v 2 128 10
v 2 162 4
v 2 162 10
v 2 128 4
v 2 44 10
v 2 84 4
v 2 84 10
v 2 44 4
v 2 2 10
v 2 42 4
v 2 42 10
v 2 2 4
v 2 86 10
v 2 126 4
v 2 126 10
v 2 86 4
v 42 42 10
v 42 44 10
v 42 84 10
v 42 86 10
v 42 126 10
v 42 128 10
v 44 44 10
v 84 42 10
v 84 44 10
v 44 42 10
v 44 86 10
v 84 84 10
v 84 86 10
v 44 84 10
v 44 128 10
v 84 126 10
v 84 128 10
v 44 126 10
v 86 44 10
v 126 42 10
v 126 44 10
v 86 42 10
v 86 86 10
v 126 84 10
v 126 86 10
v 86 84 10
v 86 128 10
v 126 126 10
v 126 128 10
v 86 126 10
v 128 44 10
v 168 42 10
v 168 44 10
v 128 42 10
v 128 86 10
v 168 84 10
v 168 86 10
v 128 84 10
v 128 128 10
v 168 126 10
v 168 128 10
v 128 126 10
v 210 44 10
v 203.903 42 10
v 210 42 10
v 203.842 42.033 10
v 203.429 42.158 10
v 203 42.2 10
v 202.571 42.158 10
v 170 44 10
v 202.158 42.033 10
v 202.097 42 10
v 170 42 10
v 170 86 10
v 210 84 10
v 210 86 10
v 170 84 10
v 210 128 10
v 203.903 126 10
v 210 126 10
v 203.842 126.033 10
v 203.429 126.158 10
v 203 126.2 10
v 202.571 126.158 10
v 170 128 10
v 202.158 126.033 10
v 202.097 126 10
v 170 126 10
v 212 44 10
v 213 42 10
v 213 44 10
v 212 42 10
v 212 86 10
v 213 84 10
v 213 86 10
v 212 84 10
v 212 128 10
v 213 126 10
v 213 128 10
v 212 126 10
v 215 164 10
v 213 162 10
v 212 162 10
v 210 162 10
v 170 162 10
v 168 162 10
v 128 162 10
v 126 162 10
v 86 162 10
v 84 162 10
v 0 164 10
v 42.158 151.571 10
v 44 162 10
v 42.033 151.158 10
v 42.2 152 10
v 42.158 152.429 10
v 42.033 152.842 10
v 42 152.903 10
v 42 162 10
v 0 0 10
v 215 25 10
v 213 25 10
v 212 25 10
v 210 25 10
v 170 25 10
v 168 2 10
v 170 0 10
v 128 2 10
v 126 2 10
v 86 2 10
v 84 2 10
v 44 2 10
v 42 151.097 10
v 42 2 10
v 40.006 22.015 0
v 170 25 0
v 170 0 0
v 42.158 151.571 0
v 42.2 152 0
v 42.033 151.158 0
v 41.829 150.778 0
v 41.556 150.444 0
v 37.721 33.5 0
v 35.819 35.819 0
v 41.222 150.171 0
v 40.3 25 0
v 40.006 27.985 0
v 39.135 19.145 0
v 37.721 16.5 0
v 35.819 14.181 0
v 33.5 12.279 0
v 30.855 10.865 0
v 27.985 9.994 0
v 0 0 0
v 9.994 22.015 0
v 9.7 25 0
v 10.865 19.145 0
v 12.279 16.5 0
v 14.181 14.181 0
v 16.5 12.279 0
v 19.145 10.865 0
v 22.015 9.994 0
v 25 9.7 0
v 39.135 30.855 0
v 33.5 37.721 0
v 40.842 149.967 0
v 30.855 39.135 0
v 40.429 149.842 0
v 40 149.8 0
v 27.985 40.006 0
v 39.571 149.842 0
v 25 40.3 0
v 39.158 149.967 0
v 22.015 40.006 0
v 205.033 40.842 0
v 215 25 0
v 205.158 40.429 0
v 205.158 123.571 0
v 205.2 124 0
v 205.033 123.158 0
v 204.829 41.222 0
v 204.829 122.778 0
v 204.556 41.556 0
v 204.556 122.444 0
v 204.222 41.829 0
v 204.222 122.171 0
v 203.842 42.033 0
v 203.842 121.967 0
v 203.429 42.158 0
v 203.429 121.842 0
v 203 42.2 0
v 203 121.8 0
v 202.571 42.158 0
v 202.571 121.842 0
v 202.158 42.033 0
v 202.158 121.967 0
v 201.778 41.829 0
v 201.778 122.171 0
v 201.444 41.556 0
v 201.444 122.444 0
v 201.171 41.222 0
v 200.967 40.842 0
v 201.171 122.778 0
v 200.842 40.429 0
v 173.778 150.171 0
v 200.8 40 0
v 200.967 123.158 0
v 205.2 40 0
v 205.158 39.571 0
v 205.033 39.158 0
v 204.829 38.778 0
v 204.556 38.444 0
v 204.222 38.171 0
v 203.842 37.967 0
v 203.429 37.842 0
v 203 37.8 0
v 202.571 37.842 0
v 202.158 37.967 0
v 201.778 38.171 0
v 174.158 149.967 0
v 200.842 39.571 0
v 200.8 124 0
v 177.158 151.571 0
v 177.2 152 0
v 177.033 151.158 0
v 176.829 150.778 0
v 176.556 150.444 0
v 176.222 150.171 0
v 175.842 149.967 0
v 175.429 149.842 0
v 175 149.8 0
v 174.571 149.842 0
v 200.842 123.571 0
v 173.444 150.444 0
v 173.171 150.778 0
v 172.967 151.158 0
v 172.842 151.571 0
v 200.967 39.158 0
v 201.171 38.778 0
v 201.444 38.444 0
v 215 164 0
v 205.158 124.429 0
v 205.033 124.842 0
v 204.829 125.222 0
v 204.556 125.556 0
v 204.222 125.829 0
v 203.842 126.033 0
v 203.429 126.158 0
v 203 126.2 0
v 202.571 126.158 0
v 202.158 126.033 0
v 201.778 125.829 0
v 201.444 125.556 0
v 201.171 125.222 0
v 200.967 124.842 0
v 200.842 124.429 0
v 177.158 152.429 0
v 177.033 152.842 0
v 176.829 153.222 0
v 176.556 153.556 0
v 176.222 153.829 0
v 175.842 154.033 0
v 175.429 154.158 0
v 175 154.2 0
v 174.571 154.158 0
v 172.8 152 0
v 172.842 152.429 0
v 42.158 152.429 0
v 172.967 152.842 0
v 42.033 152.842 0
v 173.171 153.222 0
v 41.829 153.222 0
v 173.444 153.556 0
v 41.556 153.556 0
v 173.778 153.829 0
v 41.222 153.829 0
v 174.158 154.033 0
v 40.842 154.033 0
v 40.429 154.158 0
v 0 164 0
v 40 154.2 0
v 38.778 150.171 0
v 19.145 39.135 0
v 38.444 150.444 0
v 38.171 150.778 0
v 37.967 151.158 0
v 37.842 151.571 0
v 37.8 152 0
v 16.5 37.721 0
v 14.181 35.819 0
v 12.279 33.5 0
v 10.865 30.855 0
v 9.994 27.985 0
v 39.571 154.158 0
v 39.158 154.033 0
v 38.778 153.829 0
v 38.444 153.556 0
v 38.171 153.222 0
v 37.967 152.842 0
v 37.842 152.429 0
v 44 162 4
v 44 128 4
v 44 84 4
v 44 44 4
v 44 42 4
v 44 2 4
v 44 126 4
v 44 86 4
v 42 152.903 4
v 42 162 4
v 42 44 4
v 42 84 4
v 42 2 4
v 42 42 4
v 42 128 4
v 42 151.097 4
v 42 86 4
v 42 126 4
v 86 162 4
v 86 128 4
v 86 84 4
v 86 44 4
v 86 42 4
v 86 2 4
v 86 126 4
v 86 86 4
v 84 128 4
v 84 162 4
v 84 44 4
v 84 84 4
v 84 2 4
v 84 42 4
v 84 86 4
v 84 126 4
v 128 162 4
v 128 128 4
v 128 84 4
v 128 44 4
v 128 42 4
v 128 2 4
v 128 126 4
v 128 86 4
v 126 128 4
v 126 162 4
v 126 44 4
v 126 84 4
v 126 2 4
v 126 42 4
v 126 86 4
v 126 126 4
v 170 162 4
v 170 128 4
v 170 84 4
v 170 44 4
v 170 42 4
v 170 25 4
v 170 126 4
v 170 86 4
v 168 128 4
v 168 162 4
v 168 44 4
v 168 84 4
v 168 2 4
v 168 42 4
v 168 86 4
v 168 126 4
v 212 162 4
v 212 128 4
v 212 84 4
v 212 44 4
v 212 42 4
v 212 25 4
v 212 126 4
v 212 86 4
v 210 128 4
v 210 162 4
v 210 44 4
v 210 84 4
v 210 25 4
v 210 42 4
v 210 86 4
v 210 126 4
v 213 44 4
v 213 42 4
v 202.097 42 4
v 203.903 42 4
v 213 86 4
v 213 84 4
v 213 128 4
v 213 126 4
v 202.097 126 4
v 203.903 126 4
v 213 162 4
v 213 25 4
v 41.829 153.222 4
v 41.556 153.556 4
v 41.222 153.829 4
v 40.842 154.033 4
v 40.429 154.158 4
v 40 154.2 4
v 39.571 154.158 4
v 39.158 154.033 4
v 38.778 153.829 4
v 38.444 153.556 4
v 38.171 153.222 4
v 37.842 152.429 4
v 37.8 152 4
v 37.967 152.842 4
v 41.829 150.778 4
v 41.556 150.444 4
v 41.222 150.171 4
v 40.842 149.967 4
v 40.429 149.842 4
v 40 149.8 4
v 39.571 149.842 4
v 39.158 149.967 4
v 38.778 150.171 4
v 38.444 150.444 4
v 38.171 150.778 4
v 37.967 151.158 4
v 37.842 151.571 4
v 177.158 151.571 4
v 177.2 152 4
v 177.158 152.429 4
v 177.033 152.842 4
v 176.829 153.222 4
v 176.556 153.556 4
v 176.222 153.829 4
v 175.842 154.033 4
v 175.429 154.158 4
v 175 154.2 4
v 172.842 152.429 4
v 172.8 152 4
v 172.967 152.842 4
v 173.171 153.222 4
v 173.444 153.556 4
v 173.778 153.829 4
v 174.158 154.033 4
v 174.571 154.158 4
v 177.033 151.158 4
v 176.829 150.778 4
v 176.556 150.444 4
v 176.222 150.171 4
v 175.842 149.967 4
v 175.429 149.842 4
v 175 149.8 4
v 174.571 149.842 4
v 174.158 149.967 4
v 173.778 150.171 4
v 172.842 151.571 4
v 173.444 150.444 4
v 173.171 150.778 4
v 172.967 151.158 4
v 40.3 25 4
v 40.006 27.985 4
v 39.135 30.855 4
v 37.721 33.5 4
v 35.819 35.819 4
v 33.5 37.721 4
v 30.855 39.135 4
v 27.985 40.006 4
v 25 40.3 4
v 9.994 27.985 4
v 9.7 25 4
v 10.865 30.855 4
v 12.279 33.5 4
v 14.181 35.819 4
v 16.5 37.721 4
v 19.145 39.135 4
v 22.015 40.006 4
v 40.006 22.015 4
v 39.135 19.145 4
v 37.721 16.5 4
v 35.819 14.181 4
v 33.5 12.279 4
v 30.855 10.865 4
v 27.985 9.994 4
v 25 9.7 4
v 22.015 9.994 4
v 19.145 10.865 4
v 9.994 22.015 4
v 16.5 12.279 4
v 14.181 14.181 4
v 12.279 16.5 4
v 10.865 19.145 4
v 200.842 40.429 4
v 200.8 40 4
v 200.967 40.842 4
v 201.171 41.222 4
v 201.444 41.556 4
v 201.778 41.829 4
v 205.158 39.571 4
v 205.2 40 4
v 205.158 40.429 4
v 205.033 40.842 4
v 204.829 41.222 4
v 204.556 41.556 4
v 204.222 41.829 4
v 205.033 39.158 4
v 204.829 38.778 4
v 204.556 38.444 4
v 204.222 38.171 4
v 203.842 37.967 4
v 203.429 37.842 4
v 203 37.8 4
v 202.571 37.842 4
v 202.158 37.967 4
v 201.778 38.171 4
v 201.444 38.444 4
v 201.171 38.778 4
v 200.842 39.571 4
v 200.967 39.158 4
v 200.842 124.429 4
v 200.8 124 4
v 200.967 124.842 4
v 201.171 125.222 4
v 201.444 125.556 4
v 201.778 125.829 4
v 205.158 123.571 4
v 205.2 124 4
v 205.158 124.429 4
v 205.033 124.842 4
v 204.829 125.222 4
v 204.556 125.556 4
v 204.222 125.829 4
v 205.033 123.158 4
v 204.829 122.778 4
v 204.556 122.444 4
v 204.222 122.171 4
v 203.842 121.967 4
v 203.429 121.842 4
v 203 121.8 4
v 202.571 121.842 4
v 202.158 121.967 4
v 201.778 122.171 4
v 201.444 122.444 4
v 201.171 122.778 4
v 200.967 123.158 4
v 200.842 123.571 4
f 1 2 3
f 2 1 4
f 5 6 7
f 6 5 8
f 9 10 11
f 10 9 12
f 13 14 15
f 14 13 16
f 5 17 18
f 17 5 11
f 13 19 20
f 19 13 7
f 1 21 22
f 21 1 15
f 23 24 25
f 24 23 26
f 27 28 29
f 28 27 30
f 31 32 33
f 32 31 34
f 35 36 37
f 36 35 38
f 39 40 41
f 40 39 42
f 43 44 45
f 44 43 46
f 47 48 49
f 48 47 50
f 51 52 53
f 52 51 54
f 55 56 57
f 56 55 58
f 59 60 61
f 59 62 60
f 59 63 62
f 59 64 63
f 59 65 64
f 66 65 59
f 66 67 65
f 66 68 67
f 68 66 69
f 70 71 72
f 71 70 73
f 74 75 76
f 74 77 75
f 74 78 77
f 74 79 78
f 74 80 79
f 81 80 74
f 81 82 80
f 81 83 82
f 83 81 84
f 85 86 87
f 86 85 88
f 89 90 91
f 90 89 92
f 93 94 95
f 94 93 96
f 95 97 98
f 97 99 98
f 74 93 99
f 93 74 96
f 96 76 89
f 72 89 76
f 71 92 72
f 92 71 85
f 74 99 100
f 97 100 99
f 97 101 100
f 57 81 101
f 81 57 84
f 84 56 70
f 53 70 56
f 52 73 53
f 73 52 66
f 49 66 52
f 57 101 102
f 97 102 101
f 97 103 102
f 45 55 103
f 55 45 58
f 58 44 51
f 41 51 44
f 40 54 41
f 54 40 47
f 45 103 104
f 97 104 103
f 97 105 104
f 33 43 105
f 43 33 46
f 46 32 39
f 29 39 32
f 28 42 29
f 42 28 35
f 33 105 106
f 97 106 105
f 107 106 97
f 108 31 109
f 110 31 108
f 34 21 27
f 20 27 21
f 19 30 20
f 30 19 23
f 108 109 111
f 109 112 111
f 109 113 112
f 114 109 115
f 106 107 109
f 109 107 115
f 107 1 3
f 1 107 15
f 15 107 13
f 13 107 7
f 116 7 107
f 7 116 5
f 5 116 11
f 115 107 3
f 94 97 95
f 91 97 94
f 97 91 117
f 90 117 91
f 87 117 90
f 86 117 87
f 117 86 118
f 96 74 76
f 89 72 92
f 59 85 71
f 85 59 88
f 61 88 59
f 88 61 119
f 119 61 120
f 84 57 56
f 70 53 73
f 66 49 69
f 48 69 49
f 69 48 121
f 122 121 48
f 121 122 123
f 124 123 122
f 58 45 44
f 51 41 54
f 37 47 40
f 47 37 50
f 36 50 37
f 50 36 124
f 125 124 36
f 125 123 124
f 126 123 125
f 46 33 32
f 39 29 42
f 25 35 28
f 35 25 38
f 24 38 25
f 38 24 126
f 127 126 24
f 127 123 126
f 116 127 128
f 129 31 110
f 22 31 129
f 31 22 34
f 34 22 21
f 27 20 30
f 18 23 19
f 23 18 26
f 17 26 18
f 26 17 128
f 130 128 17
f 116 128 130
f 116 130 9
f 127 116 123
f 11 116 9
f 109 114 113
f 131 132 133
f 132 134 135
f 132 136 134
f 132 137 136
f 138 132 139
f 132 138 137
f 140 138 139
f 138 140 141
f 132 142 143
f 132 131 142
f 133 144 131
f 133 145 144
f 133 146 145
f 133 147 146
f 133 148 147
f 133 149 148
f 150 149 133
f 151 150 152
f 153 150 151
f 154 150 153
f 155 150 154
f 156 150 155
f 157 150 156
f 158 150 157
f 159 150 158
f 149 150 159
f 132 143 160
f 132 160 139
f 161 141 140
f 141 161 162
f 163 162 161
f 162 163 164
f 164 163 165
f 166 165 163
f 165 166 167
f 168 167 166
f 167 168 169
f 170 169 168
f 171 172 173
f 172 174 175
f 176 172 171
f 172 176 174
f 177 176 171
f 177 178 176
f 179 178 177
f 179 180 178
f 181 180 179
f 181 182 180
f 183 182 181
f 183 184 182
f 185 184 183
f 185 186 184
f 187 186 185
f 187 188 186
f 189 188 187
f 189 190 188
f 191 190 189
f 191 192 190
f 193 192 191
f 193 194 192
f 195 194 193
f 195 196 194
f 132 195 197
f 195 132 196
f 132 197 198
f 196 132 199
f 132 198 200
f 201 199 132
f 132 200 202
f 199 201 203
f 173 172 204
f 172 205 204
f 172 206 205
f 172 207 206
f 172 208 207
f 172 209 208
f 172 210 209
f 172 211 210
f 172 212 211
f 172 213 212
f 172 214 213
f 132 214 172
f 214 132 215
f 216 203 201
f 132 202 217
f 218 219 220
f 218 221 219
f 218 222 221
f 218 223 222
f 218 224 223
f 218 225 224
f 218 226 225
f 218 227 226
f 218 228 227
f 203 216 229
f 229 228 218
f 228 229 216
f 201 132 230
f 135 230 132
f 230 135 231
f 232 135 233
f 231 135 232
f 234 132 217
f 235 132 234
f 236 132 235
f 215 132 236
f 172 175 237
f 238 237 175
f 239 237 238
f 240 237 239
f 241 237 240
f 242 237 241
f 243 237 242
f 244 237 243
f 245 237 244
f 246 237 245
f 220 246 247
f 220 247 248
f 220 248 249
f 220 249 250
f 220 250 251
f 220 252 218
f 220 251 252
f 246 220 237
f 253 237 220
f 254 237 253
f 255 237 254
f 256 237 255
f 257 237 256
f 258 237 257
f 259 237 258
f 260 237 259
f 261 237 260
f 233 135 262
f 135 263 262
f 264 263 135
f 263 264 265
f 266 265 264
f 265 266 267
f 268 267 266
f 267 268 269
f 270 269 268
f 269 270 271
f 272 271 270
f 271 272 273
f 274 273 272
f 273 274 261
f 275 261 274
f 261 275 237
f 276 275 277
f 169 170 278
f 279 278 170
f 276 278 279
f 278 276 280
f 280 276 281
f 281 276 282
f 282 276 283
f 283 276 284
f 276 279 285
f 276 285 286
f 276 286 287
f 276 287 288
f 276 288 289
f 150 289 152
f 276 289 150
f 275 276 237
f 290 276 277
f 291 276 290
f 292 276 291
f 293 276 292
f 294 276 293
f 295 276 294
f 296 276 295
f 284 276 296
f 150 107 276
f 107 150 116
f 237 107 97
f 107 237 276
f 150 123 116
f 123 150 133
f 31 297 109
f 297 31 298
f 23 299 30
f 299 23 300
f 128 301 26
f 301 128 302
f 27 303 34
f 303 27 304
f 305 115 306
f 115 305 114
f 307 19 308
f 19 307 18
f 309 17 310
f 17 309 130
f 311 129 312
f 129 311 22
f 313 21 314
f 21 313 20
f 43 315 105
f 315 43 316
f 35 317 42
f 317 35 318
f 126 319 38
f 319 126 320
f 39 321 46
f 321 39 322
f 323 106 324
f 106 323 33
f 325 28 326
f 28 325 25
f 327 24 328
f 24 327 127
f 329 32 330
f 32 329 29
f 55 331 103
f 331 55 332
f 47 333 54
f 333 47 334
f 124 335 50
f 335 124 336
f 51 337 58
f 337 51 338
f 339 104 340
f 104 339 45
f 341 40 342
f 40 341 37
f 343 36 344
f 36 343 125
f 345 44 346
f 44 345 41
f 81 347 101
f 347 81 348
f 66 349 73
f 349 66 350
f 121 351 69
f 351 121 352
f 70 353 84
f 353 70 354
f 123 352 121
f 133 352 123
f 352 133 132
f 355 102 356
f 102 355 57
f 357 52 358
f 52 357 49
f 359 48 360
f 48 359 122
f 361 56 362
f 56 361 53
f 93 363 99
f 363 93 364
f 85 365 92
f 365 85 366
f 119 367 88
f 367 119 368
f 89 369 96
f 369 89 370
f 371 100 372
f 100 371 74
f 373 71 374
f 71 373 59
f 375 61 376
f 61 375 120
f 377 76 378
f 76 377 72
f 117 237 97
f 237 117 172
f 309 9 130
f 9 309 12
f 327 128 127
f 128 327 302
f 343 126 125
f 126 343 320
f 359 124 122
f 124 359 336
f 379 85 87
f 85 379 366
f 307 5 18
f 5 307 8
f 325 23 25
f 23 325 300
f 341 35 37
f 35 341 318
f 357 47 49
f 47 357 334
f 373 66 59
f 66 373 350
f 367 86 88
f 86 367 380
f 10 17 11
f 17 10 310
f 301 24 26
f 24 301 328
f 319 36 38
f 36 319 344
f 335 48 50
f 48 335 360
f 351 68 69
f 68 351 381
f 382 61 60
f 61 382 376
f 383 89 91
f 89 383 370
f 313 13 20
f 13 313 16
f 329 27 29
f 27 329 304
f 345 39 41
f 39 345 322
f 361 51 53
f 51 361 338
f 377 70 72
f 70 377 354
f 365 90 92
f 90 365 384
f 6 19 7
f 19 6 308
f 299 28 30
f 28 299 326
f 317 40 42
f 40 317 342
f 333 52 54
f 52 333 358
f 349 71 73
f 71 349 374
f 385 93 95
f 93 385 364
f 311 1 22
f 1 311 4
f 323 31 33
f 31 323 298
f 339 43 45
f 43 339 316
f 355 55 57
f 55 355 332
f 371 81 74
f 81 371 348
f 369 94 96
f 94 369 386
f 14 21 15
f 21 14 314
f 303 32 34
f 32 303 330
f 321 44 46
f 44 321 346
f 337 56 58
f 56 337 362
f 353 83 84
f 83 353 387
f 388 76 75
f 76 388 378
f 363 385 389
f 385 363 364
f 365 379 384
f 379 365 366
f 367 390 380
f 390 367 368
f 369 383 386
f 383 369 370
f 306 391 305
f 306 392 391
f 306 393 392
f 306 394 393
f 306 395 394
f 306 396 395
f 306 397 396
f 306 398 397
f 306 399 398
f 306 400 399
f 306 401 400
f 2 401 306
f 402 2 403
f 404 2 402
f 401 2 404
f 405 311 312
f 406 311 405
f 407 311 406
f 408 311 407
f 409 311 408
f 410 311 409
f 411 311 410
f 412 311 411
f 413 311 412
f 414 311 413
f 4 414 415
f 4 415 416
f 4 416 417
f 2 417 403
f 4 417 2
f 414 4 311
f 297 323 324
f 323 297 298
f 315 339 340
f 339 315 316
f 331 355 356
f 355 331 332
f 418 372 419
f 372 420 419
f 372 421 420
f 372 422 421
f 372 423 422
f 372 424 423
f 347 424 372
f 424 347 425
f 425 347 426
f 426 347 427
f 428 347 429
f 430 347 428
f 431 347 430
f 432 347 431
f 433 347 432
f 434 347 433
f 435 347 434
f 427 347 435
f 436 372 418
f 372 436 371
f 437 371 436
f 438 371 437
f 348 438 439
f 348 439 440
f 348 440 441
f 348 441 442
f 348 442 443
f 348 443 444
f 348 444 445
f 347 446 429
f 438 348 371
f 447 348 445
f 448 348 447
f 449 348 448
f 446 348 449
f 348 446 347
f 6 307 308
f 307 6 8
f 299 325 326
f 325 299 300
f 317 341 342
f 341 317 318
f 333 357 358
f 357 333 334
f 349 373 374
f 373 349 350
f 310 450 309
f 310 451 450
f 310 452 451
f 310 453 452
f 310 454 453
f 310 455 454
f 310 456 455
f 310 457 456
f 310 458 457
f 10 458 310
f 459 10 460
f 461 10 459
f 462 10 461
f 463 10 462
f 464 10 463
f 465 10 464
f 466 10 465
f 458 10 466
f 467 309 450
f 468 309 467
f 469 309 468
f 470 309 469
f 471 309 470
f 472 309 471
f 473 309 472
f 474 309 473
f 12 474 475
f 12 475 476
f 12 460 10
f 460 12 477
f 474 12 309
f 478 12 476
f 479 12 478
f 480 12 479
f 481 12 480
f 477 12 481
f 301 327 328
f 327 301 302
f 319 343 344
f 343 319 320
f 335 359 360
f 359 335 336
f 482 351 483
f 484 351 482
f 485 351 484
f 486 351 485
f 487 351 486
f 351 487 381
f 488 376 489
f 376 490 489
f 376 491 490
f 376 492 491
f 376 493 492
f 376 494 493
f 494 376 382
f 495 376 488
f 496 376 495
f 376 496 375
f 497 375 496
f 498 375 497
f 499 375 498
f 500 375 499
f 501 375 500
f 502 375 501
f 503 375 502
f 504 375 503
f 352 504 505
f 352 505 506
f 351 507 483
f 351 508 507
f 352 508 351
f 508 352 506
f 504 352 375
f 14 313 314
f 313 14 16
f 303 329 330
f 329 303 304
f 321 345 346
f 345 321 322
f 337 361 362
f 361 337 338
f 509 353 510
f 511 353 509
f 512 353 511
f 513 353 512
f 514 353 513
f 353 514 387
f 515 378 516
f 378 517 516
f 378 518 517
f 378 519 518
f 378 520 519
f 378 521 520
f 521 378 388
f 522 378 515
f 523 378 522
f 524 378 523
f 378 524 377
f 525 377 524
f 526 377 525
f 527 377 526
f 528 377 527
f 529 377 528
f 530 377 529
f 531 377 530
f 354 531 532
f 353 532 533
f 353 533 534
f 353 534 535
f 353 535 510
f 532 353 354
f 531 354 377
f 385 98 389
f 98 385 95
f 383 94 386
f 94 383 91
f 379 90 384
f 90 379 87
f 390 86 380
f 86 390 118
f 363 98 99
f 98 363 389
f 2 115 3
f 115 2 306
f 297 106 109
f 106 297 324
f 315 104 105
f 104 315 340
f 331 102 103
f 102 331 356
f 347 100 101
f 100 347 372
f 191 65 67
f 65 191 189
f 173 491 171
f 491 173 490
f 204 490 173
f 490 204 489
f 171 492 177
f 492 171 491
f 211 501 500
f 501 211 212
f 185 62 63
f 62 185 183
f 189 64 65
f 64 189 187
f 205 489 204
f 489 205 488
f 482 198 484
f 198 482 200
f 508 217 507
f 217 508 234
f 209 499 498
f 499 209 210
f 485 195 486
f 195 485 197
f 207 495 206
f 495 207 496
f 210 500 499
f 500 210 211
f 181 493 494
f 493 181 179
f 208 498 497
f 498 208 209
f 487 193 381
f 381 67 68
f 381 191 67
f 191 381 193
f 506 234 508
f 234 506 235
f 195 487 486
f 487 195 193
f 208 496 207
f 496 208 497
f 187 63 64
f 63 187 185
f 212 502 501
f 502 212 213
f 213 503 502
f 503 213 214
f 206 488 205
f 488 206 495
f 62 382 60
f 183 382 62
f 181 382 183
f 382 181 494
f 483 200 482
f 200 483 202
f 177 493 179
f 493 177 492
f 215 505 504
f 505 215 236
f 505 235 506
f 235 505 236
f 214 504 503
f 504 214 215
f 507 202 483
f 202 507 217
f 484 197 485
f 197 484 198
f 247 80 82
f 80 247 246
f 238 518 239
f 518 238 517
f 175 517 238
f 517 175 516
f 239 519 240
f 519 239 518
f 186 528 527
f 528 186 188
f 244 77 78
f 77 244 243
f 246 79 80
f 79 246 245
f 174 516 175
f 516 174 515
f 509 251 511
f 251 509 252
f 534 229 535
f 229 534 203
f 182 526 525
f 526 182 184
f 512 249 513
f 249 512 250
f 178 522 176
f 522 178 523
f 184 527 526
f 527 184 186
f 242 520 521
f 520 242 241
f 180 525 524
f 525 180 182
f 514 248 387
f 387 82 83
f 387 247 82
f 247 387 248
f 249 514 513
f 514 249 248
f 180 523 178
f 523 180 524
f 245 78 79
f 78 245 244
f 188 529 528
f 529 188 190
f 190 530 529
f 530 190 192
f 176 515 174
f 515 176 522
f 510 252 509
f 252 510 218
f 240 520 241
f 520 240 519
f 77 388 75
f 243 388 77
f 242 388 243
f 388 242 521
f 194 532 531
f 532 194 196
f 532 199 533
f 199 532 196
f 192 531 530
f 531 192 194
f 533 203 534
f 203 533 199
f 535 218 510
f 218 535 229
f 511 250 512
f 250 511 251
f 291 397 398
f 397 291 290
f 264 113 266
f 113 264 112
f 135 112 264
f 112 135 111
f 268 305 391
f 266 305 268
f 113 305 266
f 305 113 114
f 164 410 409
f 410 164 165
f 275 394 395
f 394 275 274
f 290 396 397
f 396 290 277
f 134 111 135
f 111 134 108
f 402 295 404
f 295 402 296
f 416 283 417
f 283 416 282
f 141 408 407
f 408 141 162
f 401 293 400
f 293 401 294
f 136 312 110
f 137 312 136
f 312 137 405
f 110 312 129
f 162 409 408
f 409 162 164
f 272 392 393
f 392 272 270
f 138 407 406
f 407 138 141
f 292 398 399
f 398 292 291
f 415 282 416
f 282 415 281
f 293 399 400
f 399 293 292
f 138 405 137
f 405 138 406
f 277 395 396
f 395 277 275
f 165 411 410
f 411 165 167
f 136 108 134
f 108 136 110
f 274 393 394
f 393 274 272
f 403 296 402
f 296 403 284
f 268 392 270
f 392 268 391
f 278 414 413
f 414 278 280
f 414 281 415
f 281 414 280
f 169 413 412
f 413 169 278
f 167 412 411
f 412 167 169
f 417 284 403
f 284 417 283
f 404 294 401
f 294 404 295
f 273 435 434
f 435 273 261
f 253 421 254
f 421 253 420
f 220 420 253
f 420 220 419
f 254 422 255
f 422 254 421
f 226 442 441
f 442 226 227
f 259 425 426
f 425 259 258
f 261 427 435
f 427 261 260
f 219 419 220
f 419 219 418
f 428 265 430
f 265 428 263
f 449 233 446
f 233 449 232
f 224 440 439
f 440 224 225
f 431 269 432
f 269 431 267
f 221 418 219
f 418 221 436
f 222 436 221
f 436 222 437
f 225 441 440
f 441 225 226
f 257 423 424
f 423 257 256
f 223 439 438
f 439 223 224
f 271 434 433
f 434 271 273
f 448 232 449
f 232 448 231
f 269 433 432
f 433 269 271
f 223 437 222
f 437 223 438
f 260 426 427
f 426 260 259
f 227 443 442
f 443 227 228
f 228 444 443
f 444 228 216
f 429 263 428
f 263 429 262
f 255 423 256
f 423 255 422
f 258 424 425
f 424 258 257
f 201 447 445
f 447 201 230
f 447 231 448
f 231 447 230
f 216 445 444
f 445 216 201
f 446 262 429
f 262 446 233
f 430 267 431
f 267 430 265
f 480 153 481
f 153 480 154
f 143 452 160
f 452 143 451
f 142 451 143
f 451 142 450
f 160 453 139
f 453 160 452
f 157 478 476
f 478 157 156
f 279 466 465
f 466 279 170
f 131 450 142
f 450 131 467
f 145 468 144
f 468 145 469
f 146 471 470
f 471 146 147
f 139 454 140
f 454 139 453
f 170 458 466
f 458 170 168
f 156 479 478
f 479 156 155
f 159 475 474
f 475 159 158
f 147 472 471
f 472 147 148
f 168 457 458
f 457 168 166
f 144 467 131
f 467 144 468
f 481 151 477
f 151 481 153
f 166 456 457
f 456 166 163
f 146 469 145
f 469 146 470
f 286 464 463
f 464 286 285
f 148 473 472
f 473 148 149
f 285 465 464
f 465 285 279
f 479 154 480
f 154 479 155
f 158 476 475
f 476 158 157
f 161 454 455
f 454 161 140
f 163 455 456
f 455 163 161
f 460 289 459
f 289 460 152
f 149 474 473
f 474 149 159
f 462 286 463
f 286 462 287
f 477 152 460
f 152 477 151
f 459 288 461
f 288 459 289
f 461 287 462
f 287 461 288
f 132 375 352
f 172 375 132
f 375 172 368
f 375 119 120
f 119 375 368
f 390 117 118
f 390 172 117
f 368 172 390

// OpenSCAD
// file: ../fts_rejilla.scad
// FTS Herramientas MX · sistema de siluetas para cajones PACKOUT (sesion nocturna 1, #330)
// Material: PETG. Unidades: mm. Todo es parametrico; los valores por defecto salen de la Fase 4 (#325).
//
// PIEZAS
//   loseta(x0, y0, w, h)   placa base con agujeros en una rejilla de 21 mm (la rejilla de 42 mm mas sus puntos medios).
//                          Un cajon se cubre con 4 losetas que caben en una cama de 220 mm.
//   ficha(pts, alto, x, y) charola independiente por herramienta: contorno libre, pernos que caen exactamente en los
//                          agujeros de la loseta (se calculan con la posicion absoluta de la ficha en el cajon).
//   bandeja_8420_cuadrante(i) / poste_8420()   bandeja removible de media altura para la 48-22-8420.
//
// HOLGURAS (Fase 4)
//   entre piezas 12 mm = 3 de pared + 6 de agarre + 3 de pared; contra la pared del cajon 6 mm;
//   alto 10 mm = 3 de base + 7 libres. Holgura herramienta-contorno: 1.0 mm por lado (PETG, boquilla 0.4).

PASO        = 21;     // rejilla de anclaje: 42 mm / 2
ORIGEN      = 10.5;   // primer agujero a medio paso del borde del cajon
D_AGUJERO   = 5.4;    // agujero en la loseta
D_PERNO     = 5.0;    // perno bajo la ficha (0.2 mm de juego por lado)
ALTO_PERNO  = 2.2;
ESP_LOSETA  = 2.4;
BASE_FICHA  = 1.2;    // piso de la ficha (loseta 2.4 + piso 1.2 = 3.6 ~ los 3 mm de base de la Fase 4)
PARED       = 3;      // pared de la silueta
HOLGURA     = 1.0;    // entre herramienta y contorno, por lado
DEDO        = 22;     // diametro del rebaje para meter los dedos
MARGEN_PERNO= 5;      // un perno se pone solo si queda a >= 5 mm del borde de la ficha
$fn = 32;

// ------------------------------------------------------------------ loseta
module loseta(x0, y0, w, h, ancho_cajon, fondo_cajon) {
    difference() {
        translate([x0, y0, 0]) cube([w, h, ESP_LOSETA]);
        for (i = [0 : floor((ancho_cajon - ORIGEN) / PASO)], j = [0 : floor((fondo_cajon - ORIGEN) / PASO)]) {
            px = ORIGEN + i * PASO; py = ORIGEN + j * PASO;
            if (px > x0 + 3 && px < x0 + w - 3 && py > y0 + 3 && py < y0 + h - 3)
                translate([px, py, -1]) cylinder(d = D_AGUJERO, h = ESP_LOSETA + 2);
        }
        // rotulo en bajo relieve: cajon y posicion de la loseta
    }
}

// ------------------------------------------------------------------ ficha
// pts: contorno de la HERRAMIENTA en coordenadas locales (0,0 = esquina de su rectangulo envolvente), sin holgura.
// L, A: rectangulo envolvente de la herramienta. prof: profundidad de la cavidad. (x, y): esquina de la herramienta
// dentro del cajon, tal como la da el acomodo. etiqueta: numero de activo grabado en el piso de la ficha.
module ficha(pts, L, A, prof, x, y, etiqueta = "") {
    ext = PARED + HOLGURA;
    alto = BASE_FICHA + prof;
    translate([x, y, ESP_LOSETA]) difference() {
        union() {
            // cuerpo: contorno + holgura + pared, con esquinas redondeadas
            linear_extrude(alto) offset(r = ext) polygon(pts);
            // pernos: en cada punto de la rejilla que cae dentro de la HUELLA REAL de la ficha, a >= MARGEN_PERNO del borde
            intersection() {
                translate([0, 0, -ALTO_PERNO]) linear_extrude(ALTO_PERNO + 0.01) offset(r = ext - MARGEN_PERNO) polygon(pts);
                for (i = [0 : 40], j = [0 : 30]) {
                    gx = ORIGEN + i * PASO - x; gy = ORIGEN + j * PASO - y;
                    if (gx > -ext && gx < L + ext && gy > -ext && gy < A + ext)
                        translate([gx, gy, -ALTO_PERNO]) cylinder(d = D_PERNO, h = ALTO_PERNO + 0.01);
                }
            }
        }
        // cavidad de la herramienta
        translate([0, 0, BASE_FICHA]) linear_extrude(prof + 1) offset(delta = HOLGURA) polygon(pts);
        // rebajes para dedos, al centro de los dos lados largos
        for (s = [0, 1]) translate([L / 2, s == 0 ? -ext : A + ext, BASE_FICHA + DEDO / 2]) rotate([0, 90, 0]) cylinder(d = DEDO, h = min(L * 0.5, 60), center = true);
        // numero de activo grabado en el piso (0.6 mm)
        if (etiqueta != "") translate([L / 2, A / 2, BASE_FICHA - 0.6]) linear_extrude(1) text(etiqueta, size = min(5, A / 4), halign = "center", valign = "center");
    }
}

// ------------------------------------------------------------------ bandeja 8420
// Cajon de la 8420: 432 x 330 (el 432 es fragmento de buscador; medir) x 406 de alto (fabricante).
// Bandeja a media altura: cara superior a 200 mm del piso; deja 190 arriba y 200 abajo (Fase 4).
// Se imprime en 4 cuadrantes de 215 x 164 (caben en 220) que se unen con 6 tornillos M4 y descansa en 4 postes.
B_ANCHO = 430; B_FONDO = 328; B_ESP = 4; B_COSTILLA = 10; B_ALTURA = 200; D_POSTE = 30;
module bandeja_8420_cuadrante(i) {   // i = 0..3; cada uno mide 215 x 164, cabe en la cama de 220
    w = B_ANCHO / 2; h = B_FONDO / 2; ox = (i % 2) * w; oy = floor(i / 2) * h;
    translate([ox, oy, 0]) difference() {
        union() {
            cube([w, h, B_ESP]);
            // costillas cada 42 mm en las dos direcciones (rigidez para 15 kg, supuesto de diseno)
            for (k = [0 : 42 : w - 2]) translate([k, 0, 0]) cube([2, h, B_COSTILLA]);
            for (k = [0 : 42 : h - 2]) translate([0, k, 0]) cube([w, 2, B_COSTILLA]);
            translate([w - 2, 0, 0]) cube([2, h, B_COSTILLA]); translate([0, h - 2, 0]) cube([w, 2, B_COSTILLA]);
        }
        // agujeros M4 a 12 mm de las costuras, para las placas de union (2 por costura y lado)
        sx = (i % 2 == 0) ? w - 12 : 12; sy = (floor(i / 2) == 0) ? h - 12 : 12;
        for (t = [40, h - 40]) translate([sx, t, -1]) cylinder(d = 4.4, h = 20);
        for (t = [40, w - 40]) translate([t, sy, -1]) cylinder(d = 4.4, h = 20);
        // asiento del poste en la esquina exterior
        cx = (i % 2 == 0) ? 25 : w - 25; cy = (floor(i / 2) == 0) ? 25 : h - 25;
        translate([cx, cy, -1]) cylinder(d = D_POSTE + 0.6, h = B_COSTILLA - 3);
        // agarradera: ranura de 45 x 25 en el borde frontal de los dos cuadrantes de enfrente
        if (floor(i / 2) == 0) translate([(i % 2 == 0) ? w - 45 : 0, -1, -1]) cube([45, 26, 30]);
    }
}
module placa_union() {   // 4 piezas por bandeja; se atornillan por debajo cruzando la costura (M4 x 16)
    difference() { cube([60, 24, 4]); for (x = [6, 30]) translate([x, 12, -1]) cylinder(d = 4.4, h = 6); }
}
module poste_8420() {   // 4 piezas; cada una se imprime parada
    difference() { cylinder(d = D_POSTE, h = B_ALTURA - B_ESP); translate([0, 0, -1]) cylinder(d = D_POSTE - 6, h = B_ALTURA); }
}
// main file
include <../fts_rejilla.scad>
PARTE = "c0";
for (i = [0:3]) if (PARTE == str("c", i)) bandeja_8420_cuadrante(i);
if (PARTE == "poste") poste_8420();
if (PARTE == "union") placa_union();
if (PARTE == "todo") { for (i = [0:3]) color("#f2b705") bandeja_8420_cuadrante(i); }
